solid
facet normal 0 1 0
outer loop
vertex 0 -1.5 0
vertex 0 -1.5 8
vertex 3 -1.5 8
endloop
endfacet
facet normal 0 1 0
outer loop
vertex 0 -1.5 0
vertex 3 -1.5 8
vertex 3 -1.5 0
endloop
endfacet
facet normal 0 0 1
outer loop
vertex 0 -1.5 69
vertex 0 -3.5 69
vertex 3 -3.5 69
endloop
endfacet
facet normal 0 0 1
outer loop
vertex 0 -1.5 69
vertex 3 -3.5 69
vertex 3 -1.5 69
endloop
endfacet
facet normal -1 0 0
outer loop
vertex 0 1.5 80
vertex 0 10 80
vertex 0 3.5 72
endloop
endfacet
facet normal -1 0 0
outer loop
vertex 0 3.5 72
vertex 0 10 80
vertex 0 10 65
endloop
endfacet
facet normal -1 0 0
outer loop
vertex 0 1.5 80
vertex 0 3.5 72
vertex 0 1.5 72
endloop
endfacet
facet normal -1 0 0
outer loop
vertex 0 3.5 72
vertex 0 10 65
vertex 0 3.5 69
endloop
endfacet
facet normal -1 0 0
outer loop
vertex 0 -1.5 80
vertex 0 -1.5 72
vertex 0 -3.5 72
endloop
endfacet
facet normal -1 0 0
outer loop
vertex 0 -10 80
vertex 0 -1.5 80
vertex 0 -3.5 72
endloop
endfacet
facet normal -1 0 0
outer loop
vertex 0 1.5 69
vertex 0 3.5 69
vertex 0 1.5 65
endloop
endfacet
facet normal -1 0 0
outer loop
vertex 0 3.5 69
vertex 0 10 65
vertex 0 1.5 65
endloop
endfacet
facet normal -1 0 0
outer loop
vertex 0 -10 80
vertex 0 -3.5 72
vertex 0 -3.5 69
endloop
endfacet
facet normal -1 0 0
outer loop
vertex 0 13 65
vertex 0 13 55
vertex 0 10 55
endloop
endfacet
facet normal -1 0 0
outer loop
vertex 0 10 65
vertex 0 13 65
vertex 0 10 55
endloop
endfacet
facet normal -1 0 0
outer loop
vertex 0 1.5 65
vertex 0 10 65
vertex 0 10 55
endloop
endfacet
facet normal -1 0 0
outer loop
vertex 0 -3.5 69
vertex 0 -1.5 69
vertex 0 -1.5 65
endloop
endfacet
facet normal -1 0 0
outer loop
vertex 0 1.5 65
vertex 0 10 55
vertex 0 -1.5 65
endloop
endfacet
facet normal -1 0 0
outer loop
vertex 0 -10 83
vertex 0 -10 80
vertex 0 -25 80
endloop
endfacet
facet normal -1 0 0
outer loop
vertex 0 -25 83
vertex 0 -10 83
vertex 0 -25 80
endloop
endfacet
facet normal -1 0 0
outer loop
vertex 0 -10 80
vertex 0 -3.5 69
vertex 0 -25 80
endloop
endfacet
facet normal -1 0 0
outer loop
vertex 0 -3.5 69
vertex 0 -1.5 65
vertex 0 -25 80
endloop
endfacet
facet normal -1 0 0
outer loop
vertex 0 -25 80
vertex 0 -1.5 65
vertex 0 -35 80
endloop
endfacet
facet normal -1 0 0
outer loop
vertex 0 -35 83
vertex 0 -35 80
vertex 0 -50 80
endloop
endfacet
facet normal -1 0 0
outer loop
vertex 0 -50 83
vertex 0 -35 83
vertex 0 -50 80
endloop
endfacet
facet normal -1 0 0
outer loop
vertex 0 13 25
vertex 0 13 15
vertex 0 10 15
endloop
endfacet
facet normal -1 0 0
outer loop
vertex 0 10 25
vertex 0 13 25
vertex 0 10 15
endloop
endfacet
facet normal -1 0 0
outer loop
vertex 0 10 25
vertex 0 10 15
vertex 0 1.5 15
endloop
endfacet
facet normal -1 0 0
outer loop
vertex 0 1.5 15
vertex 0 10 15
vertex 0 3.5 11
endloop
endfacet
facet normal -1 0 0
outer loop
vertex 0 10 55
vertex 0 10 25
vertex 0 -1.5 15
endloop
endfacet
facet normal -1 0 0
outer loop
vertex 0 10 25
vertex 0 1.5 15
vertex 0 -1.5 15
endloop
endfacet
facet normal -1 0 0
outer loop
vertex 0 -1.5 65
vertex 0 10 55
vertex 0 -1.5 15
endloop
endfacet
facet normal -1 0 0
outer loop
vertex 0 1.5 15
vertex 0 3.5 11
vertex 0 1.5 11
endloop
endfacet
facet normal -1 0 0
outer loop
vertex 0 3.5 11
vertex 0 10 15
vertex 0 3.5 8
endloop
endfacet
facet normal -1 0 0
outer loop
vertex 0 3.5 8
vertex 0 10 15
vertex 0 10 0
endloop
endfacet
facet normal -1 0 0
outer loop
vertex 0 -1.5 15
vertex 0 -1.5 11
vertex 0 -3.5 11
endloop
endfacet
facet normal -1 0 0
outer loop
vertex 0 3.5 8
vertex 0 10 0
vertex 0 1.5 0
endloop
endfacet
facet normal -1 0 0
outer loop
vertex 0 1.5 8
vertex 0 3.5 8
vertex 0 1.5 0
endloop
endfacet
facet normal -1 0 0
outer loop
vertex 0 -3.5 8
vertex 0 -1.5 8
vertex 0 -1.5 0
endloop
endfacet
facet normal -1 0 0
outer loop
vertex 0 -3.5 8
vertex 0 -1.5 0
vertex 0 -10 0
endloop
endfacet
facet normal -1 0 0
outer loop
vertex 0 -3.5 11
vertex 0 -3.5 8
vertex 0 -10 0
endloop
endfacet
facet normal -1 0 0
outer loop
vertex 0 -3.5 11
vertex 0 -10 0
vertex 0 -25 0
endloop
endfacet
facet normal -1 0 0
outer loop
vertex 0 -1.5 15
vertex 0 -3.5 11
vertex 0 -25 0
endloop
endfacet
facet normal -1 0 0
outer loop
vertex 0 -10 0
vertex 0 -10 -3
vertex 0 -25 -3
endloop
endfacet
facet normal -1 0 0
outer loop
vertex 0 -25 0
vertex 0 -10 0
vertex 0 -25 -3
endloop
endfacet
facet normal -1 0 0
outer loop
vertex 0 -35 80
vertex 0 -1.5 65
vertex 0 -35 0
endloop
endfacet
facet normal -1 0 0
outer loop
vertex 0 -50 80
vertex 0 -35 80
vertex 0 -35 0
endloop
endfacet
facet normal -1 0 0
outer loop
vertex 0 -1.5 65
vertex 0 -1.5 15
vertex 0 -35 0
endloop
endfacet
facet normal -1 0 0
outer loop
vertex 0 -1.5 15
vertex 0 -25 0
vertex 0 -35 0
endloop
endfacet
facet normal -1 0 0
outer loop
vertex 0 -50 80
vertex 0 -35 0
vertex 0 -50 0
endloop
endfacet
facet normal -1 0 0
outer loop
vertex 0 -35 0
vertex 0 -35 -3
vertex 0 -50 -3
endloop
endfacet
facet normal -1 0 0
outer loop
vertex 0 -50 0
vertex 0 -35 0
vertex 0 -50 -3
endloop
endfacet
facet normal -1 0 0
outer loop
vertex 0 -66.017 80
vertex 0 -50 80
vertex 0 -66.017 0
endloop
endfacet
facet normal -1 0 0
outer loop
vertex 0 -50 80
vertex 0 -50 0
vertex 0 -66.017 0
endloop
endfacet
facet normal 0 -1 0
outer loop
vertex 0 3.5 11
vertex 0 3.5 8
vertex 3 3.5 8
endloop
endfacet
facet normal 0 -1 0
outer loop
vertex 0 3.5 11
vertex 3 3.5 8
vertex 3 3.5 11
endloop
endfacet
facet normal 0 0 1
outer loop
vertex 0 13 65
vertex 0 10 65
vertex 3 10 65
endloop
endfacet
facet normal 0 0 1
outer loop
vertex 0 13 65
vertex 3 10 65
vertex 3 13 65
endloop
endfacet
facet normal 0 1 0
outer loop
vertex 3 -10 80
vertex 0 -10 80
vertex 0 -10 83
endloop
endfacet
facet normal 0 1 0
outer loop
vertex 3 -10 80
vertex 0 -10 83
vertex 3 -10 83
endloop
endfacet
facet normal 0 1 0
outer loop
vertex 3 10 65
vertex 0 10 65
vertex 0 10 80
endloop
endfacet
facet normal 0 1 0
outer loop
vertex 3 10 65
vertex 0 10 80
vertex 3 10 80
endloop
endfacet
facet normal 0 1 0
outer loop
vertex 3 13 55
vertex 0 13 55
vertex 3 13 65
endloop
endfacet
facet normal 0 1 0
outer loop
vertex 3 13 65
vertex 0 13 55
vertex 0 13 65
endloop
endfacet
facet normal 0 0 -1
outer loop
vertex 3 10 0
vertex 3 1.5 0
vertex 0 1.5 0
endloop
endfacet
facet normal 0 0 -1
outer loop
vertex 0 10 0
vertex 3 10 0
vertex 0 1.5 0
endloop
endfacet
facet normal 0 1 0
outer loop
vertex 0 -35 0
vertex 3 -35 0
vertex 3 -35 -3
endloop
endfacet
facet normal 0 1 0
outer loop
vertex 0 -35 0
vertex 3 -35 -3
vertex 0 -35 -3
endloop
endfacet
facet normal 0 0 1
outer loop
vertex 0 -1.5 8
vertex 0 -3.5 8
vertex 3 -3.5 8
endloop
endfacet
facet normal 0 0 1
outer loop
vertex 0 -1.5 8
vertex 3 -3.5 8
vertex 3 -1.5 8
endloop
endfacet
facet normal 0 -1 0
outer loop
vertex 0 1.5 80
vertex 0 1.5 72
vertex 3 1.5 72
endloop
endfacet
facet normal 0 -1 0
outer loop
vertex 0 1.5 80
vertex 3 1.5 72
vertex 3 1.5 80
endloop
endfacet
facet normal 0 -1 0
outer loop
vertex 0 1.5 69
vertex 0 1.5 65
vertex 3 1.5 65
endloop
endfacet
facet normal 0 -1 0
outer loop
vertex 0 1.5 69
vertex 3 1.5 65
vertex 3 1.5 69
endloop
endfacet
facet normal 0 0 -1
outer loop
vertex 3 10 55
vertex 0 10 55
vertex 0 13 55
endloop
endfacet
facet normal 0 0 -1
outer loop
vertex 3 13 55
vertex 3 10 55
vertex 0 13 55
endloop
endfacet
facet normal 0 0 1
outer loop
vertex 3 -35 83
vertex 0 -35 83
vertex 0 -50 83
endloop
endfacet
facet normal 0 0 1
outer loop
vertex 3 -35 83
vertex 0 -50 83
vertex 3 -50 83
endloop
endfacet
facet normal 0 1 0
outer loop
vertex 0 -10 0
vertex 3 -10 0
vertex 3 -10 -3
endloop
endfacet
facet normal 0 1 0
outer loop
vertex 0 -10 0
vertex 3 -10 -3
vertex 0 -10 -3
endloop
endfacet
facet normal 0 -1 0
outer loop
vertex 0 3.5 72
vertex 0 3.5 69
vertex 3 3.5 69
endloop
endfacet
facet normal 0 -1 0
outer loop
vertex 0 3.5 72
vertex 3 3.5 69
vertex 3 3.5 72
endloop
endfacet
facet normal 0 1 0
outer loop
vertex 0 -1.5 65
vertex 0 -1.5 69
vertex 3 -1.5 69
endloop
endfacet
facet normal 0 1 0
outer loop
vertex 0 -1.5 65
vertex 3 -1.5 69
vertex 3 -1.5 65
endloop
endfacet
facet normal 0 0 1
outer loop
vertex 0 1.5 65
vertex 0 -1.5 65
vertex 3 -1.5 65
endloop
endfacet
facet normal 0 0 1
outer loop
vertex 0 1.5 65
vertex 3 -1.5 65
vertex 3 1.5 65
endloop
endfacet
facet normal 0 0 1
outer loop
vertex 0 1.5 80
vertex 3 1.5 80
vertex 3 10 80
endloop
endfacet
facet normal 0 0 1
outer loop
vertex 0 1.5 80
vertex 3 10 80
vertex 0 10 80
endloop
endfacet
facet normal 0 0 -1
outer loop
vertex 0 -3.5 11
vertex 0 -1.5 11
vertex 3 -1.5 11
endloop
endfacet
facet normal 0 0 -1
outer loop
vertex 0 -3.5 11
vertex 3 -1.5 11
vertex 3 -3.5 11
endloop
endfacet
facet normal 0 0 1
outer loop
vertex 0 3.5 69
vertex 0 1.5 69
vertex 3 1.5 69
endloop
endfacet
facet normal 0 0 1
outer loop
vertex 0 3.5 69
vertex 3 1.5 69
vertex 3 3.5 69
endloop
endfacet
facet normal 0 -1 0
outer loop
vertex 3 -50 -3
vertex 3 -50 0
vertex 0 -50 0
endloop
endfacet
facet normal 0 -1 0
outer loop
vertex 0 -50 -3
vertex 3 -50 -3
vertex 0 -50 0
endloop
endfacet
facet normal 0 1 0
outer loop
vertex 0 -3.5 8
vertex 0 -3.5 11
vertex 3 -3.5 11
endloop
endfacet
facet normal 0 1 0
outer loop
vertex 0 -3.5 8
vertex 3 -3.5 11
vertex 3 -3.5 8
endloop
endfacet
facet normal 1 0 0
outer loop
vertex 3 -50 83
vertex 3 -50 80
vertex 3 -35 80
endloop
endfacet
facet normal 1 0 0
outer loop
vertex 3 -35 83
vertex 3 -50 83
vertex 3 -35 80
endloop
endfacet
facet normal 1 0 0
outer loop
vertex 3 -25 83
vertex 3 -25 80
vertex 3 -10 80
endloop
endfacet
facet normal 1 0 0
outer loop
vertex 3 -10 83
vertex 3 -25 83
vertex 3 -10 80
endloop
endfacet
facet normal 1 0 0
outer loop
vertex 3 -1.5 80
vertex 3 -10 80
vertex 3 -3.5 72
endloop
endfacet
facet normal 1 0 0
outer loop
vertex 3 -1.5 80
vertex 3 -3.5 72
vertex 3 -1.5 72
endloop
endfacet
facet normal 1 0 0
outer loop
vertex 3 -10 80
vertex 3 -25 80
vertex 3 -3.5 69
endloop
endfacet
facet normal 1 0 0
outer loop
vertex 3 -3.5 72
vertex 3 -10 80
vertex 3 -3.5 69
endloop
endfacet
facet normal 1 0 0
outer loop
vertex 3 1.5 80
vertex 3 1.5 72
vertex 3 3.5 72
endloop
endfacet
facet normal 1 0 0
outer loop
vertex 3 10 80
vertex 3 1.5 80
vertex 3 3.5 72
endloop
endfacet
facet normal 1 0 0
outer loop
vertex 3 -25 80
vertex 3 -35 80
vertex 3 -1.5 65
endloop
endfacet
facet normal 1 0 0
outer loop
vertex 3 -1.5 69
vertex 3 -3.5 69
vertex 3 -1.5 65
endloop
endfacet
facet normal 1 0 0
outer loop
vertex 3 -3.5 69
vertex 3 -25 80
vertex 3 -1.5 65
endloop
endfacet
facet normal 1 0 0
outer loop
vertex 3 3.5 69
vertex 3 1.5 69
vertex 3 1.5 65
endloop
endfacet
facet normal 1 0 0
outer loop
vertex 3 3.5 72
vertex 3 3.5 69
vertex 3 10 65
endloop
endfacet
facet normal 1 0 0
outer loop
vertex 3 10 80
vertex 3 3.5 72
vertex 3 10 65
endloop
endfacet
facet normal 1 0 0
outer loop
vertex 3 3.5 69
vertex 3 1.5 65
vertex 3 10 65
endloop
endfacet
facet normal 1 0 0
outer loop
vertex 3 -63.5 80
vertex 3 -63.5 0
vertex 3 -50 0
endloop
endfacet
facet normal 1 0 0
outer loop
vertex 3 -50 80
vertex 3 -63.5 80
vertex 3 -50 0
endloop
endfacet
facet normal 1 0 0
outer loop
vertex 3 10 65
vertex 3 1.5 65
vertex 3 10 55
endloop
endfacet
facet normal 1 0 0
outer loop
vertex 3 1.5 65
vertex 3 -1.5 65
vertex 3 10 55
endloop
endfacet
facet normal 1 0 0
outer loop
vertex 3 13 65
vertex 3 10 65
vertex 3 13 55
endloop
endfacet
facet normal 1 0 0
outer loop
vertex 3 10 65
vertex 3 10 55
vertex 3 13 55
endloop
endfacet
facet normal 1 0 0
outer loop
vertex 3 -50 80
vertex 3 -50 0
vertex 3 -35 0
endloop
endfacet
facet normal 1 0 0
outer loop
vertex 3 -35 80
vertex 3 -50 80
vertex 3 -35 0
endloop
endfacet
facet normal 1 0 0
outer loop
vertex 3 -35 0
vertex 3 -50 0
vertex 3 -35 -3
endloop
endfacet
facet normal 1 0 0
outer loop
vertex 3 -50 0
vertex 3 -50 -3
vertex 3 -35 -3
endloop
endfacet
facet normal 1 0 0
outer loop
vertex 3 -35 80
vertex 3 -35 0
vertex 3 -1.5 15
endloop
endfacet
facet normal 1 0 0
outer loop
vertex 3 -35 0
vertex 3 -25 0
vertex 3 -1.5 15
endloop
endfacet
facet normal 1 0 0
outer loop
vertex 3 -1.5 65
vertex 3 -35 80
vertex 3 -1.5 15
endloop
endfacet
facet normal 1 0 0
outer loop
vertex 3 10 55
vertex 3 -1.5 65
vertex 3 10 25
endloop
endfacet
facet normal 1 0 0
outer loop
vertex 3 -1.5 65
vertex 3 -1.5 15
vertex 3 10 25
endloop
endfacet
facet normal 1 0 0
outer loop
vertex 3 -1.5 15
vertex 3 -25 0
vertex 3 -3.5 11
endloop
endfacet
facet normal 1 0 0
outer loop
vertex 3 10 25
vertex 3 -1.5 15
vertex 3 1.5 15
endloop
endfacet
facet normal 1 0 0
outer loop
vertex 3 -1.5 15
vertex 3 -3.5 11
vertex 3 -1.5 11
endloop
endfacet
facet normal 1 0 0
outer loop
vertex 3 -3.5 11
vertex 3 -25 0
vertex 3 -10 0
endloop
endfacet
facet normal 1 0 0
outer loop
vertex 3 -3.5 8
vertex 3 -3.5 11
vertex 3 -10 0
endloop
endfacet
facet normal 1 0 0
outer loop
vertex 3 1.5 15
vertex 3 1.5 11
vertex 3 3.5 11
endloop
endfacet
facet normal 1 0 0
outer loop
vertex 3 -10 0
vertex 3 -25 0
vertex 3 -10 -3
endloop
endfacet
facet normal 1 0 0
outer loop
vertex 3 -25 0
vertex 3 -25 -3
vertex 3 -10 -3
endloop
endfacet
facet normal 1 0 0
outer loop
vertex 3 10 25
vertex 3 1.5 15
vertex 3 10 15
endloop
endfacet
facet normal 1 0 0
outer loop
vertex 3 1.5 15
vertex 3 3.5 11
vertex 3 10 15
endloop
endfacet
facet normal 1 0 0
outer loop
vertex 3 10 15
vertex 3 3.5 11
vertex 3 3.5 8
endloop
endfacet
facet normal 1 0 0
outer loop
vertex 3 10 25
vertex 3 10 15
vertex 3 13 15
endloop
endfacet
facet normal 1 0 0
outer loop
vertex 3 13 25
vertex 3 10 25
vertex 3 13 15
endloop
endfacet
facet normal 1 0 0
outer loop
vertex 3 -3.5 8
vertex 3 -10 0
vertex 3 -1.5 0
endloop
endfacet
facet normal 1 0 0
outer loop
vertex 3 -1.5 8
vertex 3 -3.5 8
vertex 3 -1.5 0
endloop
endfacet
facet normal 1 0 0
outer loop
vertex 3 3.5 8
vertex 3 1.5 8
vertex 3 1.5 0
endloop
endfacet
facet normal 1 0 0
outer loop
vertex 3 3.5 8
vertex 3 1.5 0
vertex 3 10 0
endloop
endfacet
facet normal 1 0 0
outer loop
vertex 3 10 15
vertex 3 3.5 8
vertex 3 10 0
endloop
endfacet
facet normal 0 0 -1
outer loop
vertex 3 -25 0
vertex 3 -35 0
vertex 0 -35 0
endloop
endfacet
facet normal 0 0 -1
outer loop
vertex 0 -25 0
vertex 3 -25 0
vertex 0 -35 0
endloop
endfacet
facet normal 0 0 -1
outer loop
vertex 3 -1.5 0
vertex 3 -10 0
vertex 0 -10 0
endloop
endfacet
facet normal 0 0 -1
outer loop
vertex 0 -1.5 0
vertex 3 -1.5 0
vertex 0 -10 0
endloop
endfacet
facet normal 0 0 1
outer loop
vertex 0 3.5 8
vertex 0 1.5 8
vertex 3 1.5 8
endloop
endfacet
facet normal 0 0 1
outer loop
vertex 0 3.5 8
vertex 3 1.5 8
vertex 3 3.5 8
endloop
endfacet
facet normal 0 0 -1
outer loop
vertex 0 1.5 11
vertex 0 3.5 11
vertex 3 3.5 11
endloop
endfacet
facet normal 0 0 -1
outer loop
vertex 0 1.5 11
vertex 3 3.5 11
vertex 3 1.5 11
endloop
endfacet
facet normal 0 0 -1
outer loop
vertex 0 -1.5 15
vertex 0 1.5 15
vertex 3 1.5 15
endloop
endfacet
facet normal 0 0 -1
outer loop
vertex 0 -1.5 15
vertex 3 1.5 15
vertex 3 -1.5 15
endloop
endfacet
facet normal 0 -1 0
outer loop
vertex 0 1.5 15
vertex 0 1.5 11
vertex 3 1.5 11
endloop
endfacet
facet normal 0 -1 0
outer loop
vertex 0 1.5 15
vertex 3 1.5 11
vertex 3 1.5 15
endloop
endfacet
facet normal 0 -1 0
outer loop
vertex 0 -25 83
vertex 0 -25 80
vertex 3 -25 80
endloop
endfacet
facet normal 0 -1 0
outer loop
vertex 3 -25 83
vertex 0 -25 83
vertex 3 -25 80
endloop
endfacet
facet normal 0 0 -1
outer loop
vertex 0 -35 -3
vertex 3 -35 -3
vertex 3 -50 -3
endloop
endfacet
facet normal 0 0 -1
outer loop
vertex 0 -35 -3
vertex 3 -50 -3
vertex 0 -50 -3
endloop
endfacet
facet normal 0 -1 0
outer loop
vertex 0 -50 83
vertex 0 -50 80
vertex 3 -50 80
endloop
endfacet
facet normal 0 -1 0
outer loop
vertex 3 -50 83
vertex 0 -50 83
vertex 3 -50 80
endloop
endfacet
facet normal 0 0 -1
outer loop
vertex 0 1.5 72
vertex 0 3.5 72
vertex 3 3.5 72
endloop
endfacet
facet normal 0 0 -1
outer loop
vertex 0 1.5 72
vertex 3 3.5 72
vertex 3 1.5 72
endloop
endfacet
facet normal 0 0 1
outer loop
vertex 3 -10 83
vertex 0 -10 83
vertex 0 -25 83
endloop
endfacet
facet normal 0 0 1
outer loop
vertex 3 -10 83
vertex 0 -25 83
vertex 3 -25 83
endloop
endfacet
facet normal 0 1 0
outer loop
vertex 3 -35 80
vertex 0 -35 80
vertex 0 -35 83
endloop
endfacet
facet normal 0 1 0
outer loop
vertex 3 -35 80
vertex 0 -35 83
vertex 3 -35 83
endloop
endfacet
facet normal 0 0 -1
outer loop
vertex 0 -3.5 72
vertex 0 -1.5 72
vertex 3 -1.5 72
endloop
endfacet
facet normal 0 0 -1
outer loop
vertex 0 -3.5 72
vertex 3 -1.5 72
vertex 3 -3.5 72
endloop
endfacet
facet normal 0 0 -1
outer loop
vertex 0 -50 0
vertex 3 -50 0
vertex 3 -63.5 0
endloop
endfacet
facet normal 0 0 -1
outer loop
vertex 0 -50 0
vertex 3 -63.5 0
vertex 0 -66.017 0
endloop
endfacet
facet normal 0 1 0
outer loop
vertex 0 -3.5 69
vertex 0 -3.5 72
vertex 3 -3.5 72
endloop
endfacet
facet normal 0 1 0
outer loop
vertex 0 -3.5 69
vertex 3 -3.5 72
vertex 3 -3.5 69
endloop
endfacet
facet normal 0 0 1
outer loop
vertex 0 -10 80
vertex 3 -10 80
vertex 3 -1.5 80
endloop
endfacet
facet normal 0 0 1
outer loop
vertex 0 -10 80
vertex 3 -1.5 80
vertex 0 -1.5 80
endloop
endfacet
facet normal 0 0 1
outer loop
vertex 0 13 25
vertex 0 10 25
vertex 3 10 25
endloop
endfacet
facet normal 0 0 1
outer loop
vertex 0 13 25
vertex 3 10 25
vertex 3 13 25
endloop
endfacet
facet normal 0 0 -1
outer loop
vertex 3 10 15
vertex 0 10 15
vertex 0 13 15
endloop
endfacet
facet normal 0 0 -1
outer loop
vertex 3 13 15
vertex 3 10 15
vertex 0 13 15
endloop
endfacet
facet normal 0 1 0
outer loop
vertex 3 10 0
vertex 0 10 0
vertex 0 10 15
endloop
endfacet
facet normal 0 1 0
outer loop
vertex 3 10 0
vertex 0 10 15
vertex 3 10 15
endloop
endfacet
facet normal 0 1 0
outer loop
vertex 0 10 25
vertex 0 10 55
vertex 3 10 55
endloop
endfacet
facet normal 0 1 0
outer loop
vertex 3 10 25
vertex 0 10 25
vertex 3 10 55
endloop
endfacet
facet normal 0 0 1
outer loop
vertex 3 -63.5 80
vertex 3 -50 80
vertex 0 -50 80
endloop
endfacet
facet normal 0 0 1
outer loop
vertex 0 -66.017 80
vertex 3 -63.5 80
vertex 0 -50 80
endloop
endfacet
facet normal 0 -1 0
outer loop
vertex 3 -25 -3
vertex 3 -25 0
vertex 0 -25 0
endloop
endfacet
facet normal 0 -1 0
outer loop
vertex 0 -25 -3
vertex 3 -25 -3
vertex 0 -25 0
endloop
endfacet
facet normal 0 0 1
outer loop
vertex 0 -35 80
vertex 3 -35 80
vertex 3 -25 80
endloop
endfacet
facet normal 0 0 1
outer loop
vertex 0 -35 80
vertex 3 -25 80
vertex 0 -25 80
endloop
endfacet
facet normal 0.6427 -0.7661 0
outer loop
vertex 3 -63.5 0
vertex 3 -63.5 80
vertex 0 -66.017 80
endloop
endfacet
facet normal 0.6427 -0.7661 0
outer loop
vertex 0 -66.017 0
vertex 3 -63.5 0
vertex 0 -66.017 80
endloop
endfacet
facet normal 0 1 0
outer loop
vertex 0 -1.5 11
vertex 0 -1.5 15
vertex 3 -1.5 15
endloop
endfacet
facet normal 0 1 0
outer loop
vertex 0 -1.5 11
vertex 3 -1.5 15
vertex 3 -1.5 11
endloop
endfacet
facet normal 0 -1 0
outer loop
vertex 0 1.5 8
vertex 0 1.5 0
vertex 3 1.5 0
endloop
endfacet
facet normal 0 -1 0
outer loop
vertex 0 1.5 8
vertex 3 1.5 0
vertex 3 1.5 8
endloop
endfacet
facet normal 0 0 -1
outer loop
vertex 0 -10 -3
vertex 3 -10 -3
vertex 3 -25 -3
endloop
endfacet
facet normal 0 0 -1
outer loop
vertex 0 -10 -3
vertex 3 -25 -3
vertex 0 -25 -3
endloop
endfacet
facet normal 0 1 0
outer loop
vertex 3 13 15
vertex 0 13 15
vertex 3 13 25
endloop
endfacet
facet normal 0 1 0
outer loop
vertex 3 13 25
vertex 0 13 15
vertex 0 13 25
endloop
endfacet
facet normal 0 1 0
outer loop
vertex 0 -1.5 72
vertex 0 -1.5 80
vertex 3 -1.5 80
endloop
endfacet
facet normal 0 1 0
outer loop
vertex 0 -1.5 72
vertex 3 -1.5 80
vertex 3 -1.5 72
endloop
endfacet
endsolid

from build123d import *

# Parameters (mm, degrees)
SALIENTE_EXTRUIR1_DEPTH = 80
CROQUIS2_W              = 3
CROQUIS2_H              = 15
SALIENTE_EXTRUIR2_DEPTH = 3
CROQUIS3_W              = 3
CROQUIS3_H              = 15
SALIENTE_EXTRUIR3_DEPTH = 3
CORTAR_EXTRUIR1_DEPTH   = 10
CROQUIS5_W              = 10
CROQUIS5_H              = 3
SALIENTE_EXTRUIR4_DEPTH = 3


with BuildPart() as part:
    # Croquis1 → Saliente-Extruir1 (new body)
    with BuildSketch(Plane.XY):
        Polygon((3, 0), (3, -63.5), (0, -66.017298894), (0, 0), (0, 10), (3, 10), align=None)
    extrude(amount=SALIENTE_EXTRUIR1_DEPTH)

    # Croquis2 → Saliente-Extruir2 (add)
    with BuildSketch(Plane.XY.offset(80)):
        with Locations((1.5, -17.5)):
            Rectangle(CROQUIS2_W, CROQUIS2_H)
        with Locations((1.5, -42.5)):
            Rectangle(CROQUIS2_W, CROQUIS2_H)
    extrude(amount=SALIENTE_EXTRUIR2_DEPTH)

    # Croquis3 → Saliente-Extruir3 (add)
    with BuildSketch(Plane(origin=(0, 0, 0), x_dir=(-1, 0, 0), z_dir=(0, 0, -1))):
        with Locations((-1.5, -17.5)):
            Rectangle(CROQUIS3_W, CROQUIS3_H)
        with Locations((-1.5, -42.5)):
            Rectangle(CROQUIS3_W, CROQUIS3_H)
    extrude(amount=SALIENTE_EXTRUIR3_DEPTH)

    # Croquis4 → Cortar-Extruir1 (cut)
    with BuildSketch(Plane.ZY):
        Polygon((0, 1.5), (8, 1.5), (8, 3.5), (11, 3.5), (11, 1.5), (15, 1.5), (15, -1.5), (11, -1.5), (11, -3.5), (8, -3.5), (8, -1.5), (0, -1.5), align=None)
        Polygon((69, -1.5), (65, -1.5), (65, 1.5), (69, 1.5), (69, 3.5), (72, 3.5), (72, 1.5), (80, 1.5), (80, -1.5), (72, -1.5), (72, -3.5), (69, -3.5), align=None)
    extrude(amount=-CORTAR_EXTRUIR1_DEPTH, mode=Mode.SUBTRACT)

    # Croquis5 → Saliente-Extruir4 (add)
    with BuildSketch(Plane.ZY):
        with Locations((20, 11.5)):
            Rectangle(CROQUIS5_W, CROQUIS5_H)
        with Locations((60, 11.5)):
            Rectangle(CROQUIS5_W, CROQUIS5_H)
    extrude(amount=-SALIENTE_EXTRUIR4_DEPTH)


solid = part.part
